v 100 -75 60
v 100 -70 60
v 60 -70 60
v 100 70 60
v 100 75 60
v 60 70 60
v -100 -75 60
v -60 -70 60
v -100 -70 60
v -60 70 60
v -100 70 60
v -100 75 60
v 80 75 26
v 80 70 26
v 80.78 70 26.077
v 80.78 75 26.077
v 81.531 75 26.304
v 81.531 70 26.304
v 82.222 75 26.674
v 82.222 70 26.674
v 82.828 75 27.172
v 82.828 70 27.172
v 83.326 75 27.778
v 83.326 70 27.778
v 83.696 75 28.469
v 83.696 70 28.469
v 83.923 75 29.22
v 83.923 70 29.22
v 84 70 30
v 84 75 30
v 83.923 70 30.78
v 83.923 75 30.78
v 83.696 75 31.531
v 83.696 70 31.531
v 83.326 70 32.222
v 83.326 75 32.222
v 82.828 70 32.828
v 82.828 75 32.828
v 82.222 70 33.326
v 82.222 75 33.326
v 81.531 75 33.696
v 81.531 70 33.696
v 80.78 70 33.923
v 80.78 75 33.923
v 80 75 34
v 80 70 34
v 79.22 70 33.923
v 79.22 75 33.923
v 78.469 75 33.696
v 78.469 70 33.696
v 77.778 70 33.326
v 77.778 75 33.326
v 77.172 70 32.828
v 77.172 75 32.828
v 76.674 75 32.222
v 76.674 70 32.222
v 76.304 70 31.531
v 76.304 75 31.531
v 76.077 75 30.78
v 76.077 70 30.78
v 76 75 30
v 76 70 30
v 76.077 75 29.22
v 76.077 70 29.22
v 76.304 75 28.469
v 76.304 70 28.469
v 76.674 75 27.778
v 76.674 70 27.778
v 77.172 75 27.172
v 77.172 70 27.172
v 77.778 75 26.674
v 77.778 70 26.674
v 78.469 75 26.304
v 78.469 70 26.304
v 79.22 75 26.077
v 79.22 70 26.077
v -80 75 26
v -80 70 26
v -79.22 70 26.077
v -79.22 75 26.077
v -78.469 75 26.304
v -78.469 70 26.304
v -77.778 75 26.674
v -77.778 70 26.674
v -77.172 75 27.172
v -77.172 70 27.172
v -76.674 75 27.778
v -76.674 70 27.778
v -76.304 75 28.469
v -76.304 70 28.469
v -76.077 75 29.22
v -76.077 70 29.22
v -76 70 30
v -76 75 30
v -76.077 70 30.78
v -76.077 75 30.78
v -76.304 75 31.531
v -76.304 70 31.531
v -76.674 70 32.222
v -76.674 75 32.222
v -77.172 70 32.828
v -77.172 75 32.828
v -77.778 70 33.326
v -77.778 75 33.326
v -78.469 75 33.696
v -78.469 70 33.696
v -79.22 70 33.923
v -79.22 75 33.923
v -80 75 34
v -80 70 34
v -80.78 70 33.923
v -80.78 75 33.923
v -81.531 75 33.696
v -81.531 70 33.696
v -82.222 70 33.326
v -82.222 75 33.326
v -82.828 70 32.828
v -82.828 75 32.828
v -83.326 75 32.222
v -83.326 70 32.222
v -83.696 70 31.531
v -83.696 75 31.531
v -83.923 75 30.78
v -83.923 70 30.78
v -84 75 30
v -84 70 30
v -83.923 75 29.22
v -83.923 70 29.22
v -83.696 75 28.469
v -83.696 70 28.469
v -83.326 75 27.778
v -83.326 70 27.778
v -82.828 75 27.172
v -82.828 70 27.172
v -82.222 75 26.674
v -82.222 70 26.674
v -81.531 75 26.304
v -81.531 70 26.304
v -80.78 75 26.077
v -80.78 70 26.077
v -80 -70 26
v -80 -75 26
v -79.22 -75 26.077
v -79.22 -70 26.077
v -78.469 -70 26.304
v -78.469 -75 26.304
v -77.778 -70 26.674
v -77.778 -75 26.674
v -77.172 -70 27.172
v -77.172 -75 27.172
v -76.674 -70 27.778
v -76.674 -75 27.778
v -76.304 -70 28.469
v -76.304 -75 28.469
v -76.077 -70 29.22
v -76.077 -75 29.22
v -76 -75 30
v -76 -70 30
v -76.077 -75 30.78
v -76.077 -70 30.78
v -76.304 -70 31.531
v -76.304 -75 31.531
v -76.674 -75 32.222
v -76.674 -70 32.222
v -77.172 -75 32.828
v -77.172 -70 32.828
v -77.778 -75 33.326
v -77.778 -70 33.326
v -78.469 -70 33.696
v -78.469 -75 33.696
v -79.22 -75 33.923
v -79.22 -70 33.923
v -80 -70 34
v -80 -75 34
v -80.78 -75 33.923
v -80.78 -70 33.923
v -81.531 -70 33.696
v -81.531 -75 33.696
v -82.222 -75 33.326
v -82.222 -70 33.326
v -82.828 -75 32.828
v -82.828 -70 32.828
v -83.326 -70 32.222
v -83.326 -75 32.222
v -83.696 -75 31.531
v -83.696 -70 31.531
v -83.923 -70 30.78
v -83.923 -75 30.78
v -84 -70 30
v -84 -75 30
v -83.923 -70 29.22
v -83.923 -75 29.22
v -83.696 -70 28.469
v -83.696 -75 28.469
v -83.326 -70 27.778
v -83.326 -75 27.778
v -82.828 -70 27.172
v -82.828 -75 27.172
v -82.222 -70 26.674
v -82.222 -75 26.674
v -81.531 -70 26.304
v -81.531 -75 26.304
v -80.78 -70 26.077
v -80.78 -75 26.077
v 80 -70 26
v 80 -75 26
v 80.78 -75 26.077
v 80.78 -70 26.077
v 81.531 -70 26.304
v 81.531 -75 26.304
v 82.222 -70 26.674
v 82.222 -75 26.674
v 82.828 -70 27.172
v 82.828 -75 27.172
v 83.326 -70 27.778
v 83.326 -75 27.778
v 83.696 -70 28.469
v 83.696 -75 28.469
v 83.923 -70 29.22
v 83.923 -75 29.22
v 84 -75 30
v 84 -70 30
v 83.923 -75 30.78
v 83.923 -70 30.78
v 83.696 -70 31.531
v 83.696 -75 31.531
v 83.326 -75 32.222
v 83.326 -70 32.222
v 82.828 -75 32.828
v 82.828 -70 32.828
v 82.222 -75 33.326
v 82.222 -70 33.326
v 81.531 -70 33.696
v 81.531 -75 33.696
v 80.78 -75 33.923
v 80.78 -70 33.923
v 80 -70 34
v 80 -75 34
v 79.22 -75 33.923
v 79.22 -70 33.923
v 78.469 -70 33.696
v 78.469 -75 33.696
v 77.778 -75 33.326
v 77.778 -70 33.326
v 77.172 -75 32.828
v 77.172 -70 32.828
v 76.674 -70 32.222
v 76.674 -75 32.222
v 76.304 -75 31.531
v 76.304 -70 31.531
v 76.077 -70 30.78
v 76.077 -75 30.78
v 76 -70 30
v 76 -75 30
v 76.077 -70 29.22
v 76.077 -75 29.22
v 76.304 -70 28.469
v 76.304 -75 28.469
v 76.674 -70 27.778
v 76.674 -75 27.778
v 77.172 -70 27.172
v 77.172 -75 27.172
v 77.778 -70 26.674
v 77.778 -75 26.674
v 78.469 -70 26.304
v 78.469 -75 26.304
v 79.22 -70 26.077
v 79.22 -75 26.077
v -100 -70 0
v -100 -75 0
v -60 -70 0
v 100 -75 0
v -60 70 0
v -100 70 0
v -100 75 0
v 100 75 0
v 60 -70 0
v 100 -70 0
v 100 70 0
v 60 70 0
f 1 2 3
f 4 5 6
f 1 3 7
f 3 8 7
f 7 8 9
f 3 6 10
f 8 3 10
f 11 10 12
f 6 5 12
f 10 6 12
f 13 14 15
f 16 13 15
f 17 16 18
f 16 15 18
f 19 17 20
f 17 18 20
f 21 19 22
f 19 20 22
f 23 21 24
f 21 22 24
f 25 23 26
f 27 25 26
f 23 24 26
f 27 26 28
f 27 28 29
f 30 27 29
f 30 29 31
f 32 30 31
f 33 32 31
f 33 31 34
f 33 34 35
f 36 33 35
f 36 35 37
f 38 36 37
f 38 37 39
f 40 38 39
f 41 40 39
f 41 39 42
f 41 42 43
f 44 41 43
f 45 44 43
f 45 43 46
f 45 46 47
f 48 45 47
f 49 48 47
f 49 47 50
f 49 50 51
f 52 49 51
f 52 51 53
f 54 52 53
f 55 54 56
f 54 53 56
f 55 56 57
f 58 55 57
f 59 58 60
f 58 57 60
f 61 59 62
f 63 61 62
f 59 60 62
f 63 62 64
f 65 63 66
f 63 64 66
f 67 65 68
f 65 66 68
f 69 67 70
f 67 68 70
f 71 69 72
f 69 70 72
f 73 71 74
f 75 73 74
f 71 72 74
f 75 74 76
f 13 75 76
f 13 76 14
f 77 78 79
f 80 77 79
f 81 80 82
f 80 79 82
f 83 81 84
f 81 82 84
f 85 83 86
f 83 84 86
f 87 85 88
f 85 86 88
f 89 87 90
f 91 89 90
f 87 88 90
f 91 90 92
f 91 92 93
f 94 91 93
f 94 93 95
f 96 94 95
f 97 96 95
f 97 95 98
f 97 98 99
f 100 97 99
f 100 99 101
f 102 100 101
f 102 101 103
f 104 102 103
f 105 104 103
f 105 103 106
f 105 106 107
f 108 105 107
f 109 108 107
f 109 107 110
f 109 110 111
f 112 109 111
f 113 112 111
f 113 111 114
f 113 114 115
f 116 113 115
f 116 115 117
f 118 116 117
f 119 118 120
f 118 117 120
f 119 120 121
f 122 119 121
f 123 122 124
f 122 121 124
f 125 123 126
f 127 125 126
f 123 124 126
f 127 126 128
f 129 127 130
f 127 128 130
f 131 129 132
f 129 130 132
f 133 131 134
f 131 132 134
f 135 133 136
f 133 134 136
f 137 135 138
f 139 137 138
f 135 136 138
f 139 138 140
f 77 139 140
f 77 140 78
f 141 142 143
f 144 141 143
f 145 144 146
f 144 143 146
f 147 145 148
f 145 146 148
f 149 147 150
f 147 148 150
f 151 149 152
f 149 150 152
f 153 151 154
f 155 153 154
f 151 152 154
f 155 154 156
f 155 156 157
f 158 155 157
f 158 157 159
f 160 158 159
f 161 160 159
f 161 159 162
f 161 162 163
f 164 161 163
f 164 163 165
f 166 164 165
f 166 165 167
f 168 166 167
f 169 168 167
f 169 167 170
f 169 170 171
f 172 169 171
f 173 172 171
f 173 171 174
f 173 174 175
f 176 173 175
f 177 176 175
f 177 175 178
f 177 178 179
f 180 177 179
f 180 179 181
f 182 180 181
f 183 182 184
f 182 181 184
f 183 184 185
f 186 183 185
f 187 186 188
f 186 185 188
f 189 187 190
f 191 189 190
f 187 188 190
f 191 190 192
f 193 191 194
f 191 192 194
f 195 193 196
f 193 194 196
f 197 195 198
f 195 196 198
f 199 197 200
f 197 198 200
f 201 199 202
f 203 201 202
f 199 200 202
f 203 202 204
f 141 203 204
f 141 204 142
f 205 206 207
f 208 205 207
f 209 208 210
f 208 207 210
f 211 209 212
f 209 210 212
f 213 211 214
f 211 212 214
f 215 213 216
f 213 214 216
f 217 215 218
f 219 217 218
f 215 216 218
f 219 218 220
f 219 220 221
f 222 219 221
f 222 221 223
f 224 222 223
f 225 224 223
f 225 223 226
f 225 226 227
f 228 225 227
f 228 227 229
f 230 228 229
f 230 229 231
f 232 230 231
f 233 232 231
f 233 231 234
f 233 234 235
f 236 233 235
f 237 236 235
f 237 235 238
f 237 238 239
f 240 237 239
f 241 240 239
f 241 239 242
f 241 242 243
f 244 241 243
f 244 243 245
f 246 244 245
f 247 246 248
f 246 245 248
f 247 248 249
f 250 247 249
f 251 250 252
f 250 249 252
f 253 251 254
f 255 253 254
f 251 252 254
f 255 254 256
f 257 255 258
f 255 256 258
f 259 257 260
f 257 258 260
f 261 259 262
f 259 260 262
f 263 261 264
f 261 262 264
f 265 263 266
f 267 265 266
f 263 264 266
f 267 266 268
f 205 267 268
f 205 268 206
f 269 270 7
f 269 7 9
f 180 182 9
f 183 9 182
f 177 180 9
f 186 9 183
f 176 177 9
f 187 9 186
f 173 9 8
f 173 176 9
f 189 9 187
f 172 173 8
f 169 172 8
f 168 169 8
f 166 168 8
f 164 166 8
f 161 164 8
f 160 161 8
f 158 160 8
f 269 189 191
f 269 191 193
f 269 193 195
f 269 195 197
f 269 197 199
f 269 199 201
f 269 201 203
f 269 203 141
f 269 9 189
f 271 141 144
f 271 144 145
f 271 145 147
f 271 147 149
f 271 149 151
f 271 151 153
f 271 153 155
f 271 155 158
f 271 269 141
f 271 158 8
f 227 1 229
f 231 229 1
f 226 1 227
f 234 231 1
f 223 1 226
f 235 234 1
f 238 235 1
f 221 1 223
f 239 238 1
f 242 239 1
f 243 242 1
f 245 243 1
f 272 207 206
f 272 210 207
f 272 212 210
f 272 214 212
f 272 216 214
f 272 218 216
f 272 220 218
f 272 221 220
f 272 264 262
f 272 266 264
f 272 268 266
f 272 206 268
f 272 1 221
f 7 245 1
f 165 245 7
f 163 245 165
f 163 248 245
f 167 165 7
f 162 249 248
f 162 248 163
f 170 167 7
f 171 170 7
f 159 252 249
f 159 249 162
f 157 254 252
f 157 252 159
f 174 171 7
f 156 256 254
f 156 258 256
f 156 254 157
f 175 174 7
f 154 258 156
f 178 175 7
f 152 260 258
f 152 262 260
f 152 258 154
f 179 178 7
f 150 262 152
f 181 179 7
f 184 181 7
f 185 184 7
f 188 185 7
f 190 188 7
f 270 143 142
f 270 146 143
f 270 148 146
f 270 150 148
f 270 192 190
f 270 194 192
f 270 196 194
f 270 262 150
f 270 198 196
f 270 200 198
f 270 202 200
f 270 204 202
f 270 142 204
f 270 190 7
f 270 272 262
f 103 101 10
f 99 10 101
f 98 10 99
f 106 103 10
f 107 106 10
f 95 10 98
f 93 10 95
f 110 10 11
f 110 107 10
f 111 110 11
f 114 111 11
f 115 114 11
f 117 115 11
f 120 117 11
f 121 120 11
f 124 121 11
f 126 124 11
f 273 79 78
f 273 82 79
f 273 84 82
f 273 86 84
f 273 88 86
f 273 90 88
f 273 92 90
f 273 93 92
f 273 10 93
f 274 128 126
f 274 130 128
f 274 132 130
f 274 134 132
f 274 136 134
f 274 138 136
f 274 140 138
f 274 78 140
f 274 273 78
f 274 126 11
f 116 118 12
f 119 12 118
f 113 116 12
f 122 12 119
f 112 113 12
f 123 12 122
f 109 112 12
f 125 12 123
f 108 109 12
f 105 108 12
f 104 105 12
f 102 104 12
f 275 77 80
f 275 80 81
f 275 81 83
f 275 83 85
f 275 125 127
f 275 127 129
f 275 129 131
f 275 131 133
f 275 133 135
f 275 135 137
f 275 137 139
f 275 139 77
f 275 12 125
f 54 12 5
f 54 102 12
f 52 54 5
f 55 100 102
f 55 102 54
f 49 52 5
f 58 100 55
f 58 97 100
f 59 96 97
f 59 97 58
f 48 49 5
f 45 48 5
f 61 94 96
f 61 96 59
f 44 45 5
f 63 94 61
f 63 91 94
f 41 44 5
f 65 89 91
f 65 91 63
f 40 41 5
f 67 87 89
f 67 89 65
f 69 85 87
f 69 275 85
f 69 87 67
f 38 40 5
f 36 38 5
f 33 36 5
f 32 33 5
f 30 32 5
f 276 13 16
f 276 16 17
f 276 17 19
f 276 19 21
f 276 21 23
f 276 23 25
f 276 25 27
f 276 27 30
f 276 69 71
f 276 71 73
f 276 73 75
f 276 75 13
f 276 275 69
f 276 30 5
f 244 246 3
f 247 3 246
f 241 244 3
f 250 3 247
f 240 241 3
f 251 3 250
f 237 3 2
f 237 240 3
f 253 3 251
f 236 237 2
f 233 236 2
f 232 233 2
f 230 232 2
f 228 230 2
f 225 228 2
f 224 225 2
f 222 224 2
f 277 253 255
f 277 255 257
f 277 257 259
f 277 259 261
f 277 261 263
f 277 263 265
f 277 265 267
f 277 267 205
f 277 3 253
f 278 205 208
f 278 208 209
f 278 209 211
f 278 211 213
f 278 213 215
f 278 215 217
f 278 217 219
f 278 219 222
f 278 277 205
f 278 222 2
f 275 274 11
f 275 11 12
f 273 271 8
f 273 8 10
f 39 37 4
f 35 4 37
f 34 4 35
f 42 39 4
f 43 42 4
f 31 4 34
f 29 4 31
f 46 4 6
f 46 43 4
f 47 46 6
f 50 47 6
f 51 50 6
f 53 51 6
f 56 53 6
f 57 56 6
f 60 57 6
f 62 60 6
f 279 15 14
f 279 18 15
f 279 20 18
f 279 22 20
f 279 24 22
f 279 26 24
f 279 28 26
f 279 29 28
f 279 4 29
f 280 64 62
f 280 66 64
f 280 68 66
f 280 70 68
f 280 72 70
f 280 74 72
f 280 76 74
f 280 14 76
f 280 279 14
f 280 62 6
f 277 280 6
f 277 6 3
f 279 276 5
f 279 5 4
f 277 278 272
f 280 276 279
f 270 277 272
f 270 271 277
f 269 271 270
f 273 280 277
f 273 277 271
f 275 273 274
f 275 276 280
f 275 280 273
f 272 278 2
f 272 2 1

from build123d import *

# Parameters (mm, degrees)
EXTRUDE_1_DEPTH     = 60
SKETCH_4_R          = 4
CUT_EXTRUDE_3_DEPTH = 198


with BuildPart() as part:
    # 草图1 → 凸台-拉伸1 (new body)
    with BuildSketch(Plane.XY):
        Polygon((-100, 75), (100, 75), (100, 70), (60, 70), (60, -70), (100, -70), (100, -75), (-100, -75), (-100, -70), (-60, -70), (-60, 70), (-100, 70), align=None)
    extrude(amount=EXTRUDE_1_DEPTH)

    # 草图4 → 切除-拉伸3 (cut)
    with BuildSketch(Plane.XZ.offset(75)):
        with Locations(Location((-80, 30, 0), (0, 0, 270))):
            Circle(SKETCH_4_R)
        with Locations(Location((80, 30, 0), (0, 0, 270))):
            Circle(SKETCH_4_R)
    extrude(amount=-CUT_EXTRUDE_3_DEPTH, mode=Mode.SUBTRACT)


solid = part.part
